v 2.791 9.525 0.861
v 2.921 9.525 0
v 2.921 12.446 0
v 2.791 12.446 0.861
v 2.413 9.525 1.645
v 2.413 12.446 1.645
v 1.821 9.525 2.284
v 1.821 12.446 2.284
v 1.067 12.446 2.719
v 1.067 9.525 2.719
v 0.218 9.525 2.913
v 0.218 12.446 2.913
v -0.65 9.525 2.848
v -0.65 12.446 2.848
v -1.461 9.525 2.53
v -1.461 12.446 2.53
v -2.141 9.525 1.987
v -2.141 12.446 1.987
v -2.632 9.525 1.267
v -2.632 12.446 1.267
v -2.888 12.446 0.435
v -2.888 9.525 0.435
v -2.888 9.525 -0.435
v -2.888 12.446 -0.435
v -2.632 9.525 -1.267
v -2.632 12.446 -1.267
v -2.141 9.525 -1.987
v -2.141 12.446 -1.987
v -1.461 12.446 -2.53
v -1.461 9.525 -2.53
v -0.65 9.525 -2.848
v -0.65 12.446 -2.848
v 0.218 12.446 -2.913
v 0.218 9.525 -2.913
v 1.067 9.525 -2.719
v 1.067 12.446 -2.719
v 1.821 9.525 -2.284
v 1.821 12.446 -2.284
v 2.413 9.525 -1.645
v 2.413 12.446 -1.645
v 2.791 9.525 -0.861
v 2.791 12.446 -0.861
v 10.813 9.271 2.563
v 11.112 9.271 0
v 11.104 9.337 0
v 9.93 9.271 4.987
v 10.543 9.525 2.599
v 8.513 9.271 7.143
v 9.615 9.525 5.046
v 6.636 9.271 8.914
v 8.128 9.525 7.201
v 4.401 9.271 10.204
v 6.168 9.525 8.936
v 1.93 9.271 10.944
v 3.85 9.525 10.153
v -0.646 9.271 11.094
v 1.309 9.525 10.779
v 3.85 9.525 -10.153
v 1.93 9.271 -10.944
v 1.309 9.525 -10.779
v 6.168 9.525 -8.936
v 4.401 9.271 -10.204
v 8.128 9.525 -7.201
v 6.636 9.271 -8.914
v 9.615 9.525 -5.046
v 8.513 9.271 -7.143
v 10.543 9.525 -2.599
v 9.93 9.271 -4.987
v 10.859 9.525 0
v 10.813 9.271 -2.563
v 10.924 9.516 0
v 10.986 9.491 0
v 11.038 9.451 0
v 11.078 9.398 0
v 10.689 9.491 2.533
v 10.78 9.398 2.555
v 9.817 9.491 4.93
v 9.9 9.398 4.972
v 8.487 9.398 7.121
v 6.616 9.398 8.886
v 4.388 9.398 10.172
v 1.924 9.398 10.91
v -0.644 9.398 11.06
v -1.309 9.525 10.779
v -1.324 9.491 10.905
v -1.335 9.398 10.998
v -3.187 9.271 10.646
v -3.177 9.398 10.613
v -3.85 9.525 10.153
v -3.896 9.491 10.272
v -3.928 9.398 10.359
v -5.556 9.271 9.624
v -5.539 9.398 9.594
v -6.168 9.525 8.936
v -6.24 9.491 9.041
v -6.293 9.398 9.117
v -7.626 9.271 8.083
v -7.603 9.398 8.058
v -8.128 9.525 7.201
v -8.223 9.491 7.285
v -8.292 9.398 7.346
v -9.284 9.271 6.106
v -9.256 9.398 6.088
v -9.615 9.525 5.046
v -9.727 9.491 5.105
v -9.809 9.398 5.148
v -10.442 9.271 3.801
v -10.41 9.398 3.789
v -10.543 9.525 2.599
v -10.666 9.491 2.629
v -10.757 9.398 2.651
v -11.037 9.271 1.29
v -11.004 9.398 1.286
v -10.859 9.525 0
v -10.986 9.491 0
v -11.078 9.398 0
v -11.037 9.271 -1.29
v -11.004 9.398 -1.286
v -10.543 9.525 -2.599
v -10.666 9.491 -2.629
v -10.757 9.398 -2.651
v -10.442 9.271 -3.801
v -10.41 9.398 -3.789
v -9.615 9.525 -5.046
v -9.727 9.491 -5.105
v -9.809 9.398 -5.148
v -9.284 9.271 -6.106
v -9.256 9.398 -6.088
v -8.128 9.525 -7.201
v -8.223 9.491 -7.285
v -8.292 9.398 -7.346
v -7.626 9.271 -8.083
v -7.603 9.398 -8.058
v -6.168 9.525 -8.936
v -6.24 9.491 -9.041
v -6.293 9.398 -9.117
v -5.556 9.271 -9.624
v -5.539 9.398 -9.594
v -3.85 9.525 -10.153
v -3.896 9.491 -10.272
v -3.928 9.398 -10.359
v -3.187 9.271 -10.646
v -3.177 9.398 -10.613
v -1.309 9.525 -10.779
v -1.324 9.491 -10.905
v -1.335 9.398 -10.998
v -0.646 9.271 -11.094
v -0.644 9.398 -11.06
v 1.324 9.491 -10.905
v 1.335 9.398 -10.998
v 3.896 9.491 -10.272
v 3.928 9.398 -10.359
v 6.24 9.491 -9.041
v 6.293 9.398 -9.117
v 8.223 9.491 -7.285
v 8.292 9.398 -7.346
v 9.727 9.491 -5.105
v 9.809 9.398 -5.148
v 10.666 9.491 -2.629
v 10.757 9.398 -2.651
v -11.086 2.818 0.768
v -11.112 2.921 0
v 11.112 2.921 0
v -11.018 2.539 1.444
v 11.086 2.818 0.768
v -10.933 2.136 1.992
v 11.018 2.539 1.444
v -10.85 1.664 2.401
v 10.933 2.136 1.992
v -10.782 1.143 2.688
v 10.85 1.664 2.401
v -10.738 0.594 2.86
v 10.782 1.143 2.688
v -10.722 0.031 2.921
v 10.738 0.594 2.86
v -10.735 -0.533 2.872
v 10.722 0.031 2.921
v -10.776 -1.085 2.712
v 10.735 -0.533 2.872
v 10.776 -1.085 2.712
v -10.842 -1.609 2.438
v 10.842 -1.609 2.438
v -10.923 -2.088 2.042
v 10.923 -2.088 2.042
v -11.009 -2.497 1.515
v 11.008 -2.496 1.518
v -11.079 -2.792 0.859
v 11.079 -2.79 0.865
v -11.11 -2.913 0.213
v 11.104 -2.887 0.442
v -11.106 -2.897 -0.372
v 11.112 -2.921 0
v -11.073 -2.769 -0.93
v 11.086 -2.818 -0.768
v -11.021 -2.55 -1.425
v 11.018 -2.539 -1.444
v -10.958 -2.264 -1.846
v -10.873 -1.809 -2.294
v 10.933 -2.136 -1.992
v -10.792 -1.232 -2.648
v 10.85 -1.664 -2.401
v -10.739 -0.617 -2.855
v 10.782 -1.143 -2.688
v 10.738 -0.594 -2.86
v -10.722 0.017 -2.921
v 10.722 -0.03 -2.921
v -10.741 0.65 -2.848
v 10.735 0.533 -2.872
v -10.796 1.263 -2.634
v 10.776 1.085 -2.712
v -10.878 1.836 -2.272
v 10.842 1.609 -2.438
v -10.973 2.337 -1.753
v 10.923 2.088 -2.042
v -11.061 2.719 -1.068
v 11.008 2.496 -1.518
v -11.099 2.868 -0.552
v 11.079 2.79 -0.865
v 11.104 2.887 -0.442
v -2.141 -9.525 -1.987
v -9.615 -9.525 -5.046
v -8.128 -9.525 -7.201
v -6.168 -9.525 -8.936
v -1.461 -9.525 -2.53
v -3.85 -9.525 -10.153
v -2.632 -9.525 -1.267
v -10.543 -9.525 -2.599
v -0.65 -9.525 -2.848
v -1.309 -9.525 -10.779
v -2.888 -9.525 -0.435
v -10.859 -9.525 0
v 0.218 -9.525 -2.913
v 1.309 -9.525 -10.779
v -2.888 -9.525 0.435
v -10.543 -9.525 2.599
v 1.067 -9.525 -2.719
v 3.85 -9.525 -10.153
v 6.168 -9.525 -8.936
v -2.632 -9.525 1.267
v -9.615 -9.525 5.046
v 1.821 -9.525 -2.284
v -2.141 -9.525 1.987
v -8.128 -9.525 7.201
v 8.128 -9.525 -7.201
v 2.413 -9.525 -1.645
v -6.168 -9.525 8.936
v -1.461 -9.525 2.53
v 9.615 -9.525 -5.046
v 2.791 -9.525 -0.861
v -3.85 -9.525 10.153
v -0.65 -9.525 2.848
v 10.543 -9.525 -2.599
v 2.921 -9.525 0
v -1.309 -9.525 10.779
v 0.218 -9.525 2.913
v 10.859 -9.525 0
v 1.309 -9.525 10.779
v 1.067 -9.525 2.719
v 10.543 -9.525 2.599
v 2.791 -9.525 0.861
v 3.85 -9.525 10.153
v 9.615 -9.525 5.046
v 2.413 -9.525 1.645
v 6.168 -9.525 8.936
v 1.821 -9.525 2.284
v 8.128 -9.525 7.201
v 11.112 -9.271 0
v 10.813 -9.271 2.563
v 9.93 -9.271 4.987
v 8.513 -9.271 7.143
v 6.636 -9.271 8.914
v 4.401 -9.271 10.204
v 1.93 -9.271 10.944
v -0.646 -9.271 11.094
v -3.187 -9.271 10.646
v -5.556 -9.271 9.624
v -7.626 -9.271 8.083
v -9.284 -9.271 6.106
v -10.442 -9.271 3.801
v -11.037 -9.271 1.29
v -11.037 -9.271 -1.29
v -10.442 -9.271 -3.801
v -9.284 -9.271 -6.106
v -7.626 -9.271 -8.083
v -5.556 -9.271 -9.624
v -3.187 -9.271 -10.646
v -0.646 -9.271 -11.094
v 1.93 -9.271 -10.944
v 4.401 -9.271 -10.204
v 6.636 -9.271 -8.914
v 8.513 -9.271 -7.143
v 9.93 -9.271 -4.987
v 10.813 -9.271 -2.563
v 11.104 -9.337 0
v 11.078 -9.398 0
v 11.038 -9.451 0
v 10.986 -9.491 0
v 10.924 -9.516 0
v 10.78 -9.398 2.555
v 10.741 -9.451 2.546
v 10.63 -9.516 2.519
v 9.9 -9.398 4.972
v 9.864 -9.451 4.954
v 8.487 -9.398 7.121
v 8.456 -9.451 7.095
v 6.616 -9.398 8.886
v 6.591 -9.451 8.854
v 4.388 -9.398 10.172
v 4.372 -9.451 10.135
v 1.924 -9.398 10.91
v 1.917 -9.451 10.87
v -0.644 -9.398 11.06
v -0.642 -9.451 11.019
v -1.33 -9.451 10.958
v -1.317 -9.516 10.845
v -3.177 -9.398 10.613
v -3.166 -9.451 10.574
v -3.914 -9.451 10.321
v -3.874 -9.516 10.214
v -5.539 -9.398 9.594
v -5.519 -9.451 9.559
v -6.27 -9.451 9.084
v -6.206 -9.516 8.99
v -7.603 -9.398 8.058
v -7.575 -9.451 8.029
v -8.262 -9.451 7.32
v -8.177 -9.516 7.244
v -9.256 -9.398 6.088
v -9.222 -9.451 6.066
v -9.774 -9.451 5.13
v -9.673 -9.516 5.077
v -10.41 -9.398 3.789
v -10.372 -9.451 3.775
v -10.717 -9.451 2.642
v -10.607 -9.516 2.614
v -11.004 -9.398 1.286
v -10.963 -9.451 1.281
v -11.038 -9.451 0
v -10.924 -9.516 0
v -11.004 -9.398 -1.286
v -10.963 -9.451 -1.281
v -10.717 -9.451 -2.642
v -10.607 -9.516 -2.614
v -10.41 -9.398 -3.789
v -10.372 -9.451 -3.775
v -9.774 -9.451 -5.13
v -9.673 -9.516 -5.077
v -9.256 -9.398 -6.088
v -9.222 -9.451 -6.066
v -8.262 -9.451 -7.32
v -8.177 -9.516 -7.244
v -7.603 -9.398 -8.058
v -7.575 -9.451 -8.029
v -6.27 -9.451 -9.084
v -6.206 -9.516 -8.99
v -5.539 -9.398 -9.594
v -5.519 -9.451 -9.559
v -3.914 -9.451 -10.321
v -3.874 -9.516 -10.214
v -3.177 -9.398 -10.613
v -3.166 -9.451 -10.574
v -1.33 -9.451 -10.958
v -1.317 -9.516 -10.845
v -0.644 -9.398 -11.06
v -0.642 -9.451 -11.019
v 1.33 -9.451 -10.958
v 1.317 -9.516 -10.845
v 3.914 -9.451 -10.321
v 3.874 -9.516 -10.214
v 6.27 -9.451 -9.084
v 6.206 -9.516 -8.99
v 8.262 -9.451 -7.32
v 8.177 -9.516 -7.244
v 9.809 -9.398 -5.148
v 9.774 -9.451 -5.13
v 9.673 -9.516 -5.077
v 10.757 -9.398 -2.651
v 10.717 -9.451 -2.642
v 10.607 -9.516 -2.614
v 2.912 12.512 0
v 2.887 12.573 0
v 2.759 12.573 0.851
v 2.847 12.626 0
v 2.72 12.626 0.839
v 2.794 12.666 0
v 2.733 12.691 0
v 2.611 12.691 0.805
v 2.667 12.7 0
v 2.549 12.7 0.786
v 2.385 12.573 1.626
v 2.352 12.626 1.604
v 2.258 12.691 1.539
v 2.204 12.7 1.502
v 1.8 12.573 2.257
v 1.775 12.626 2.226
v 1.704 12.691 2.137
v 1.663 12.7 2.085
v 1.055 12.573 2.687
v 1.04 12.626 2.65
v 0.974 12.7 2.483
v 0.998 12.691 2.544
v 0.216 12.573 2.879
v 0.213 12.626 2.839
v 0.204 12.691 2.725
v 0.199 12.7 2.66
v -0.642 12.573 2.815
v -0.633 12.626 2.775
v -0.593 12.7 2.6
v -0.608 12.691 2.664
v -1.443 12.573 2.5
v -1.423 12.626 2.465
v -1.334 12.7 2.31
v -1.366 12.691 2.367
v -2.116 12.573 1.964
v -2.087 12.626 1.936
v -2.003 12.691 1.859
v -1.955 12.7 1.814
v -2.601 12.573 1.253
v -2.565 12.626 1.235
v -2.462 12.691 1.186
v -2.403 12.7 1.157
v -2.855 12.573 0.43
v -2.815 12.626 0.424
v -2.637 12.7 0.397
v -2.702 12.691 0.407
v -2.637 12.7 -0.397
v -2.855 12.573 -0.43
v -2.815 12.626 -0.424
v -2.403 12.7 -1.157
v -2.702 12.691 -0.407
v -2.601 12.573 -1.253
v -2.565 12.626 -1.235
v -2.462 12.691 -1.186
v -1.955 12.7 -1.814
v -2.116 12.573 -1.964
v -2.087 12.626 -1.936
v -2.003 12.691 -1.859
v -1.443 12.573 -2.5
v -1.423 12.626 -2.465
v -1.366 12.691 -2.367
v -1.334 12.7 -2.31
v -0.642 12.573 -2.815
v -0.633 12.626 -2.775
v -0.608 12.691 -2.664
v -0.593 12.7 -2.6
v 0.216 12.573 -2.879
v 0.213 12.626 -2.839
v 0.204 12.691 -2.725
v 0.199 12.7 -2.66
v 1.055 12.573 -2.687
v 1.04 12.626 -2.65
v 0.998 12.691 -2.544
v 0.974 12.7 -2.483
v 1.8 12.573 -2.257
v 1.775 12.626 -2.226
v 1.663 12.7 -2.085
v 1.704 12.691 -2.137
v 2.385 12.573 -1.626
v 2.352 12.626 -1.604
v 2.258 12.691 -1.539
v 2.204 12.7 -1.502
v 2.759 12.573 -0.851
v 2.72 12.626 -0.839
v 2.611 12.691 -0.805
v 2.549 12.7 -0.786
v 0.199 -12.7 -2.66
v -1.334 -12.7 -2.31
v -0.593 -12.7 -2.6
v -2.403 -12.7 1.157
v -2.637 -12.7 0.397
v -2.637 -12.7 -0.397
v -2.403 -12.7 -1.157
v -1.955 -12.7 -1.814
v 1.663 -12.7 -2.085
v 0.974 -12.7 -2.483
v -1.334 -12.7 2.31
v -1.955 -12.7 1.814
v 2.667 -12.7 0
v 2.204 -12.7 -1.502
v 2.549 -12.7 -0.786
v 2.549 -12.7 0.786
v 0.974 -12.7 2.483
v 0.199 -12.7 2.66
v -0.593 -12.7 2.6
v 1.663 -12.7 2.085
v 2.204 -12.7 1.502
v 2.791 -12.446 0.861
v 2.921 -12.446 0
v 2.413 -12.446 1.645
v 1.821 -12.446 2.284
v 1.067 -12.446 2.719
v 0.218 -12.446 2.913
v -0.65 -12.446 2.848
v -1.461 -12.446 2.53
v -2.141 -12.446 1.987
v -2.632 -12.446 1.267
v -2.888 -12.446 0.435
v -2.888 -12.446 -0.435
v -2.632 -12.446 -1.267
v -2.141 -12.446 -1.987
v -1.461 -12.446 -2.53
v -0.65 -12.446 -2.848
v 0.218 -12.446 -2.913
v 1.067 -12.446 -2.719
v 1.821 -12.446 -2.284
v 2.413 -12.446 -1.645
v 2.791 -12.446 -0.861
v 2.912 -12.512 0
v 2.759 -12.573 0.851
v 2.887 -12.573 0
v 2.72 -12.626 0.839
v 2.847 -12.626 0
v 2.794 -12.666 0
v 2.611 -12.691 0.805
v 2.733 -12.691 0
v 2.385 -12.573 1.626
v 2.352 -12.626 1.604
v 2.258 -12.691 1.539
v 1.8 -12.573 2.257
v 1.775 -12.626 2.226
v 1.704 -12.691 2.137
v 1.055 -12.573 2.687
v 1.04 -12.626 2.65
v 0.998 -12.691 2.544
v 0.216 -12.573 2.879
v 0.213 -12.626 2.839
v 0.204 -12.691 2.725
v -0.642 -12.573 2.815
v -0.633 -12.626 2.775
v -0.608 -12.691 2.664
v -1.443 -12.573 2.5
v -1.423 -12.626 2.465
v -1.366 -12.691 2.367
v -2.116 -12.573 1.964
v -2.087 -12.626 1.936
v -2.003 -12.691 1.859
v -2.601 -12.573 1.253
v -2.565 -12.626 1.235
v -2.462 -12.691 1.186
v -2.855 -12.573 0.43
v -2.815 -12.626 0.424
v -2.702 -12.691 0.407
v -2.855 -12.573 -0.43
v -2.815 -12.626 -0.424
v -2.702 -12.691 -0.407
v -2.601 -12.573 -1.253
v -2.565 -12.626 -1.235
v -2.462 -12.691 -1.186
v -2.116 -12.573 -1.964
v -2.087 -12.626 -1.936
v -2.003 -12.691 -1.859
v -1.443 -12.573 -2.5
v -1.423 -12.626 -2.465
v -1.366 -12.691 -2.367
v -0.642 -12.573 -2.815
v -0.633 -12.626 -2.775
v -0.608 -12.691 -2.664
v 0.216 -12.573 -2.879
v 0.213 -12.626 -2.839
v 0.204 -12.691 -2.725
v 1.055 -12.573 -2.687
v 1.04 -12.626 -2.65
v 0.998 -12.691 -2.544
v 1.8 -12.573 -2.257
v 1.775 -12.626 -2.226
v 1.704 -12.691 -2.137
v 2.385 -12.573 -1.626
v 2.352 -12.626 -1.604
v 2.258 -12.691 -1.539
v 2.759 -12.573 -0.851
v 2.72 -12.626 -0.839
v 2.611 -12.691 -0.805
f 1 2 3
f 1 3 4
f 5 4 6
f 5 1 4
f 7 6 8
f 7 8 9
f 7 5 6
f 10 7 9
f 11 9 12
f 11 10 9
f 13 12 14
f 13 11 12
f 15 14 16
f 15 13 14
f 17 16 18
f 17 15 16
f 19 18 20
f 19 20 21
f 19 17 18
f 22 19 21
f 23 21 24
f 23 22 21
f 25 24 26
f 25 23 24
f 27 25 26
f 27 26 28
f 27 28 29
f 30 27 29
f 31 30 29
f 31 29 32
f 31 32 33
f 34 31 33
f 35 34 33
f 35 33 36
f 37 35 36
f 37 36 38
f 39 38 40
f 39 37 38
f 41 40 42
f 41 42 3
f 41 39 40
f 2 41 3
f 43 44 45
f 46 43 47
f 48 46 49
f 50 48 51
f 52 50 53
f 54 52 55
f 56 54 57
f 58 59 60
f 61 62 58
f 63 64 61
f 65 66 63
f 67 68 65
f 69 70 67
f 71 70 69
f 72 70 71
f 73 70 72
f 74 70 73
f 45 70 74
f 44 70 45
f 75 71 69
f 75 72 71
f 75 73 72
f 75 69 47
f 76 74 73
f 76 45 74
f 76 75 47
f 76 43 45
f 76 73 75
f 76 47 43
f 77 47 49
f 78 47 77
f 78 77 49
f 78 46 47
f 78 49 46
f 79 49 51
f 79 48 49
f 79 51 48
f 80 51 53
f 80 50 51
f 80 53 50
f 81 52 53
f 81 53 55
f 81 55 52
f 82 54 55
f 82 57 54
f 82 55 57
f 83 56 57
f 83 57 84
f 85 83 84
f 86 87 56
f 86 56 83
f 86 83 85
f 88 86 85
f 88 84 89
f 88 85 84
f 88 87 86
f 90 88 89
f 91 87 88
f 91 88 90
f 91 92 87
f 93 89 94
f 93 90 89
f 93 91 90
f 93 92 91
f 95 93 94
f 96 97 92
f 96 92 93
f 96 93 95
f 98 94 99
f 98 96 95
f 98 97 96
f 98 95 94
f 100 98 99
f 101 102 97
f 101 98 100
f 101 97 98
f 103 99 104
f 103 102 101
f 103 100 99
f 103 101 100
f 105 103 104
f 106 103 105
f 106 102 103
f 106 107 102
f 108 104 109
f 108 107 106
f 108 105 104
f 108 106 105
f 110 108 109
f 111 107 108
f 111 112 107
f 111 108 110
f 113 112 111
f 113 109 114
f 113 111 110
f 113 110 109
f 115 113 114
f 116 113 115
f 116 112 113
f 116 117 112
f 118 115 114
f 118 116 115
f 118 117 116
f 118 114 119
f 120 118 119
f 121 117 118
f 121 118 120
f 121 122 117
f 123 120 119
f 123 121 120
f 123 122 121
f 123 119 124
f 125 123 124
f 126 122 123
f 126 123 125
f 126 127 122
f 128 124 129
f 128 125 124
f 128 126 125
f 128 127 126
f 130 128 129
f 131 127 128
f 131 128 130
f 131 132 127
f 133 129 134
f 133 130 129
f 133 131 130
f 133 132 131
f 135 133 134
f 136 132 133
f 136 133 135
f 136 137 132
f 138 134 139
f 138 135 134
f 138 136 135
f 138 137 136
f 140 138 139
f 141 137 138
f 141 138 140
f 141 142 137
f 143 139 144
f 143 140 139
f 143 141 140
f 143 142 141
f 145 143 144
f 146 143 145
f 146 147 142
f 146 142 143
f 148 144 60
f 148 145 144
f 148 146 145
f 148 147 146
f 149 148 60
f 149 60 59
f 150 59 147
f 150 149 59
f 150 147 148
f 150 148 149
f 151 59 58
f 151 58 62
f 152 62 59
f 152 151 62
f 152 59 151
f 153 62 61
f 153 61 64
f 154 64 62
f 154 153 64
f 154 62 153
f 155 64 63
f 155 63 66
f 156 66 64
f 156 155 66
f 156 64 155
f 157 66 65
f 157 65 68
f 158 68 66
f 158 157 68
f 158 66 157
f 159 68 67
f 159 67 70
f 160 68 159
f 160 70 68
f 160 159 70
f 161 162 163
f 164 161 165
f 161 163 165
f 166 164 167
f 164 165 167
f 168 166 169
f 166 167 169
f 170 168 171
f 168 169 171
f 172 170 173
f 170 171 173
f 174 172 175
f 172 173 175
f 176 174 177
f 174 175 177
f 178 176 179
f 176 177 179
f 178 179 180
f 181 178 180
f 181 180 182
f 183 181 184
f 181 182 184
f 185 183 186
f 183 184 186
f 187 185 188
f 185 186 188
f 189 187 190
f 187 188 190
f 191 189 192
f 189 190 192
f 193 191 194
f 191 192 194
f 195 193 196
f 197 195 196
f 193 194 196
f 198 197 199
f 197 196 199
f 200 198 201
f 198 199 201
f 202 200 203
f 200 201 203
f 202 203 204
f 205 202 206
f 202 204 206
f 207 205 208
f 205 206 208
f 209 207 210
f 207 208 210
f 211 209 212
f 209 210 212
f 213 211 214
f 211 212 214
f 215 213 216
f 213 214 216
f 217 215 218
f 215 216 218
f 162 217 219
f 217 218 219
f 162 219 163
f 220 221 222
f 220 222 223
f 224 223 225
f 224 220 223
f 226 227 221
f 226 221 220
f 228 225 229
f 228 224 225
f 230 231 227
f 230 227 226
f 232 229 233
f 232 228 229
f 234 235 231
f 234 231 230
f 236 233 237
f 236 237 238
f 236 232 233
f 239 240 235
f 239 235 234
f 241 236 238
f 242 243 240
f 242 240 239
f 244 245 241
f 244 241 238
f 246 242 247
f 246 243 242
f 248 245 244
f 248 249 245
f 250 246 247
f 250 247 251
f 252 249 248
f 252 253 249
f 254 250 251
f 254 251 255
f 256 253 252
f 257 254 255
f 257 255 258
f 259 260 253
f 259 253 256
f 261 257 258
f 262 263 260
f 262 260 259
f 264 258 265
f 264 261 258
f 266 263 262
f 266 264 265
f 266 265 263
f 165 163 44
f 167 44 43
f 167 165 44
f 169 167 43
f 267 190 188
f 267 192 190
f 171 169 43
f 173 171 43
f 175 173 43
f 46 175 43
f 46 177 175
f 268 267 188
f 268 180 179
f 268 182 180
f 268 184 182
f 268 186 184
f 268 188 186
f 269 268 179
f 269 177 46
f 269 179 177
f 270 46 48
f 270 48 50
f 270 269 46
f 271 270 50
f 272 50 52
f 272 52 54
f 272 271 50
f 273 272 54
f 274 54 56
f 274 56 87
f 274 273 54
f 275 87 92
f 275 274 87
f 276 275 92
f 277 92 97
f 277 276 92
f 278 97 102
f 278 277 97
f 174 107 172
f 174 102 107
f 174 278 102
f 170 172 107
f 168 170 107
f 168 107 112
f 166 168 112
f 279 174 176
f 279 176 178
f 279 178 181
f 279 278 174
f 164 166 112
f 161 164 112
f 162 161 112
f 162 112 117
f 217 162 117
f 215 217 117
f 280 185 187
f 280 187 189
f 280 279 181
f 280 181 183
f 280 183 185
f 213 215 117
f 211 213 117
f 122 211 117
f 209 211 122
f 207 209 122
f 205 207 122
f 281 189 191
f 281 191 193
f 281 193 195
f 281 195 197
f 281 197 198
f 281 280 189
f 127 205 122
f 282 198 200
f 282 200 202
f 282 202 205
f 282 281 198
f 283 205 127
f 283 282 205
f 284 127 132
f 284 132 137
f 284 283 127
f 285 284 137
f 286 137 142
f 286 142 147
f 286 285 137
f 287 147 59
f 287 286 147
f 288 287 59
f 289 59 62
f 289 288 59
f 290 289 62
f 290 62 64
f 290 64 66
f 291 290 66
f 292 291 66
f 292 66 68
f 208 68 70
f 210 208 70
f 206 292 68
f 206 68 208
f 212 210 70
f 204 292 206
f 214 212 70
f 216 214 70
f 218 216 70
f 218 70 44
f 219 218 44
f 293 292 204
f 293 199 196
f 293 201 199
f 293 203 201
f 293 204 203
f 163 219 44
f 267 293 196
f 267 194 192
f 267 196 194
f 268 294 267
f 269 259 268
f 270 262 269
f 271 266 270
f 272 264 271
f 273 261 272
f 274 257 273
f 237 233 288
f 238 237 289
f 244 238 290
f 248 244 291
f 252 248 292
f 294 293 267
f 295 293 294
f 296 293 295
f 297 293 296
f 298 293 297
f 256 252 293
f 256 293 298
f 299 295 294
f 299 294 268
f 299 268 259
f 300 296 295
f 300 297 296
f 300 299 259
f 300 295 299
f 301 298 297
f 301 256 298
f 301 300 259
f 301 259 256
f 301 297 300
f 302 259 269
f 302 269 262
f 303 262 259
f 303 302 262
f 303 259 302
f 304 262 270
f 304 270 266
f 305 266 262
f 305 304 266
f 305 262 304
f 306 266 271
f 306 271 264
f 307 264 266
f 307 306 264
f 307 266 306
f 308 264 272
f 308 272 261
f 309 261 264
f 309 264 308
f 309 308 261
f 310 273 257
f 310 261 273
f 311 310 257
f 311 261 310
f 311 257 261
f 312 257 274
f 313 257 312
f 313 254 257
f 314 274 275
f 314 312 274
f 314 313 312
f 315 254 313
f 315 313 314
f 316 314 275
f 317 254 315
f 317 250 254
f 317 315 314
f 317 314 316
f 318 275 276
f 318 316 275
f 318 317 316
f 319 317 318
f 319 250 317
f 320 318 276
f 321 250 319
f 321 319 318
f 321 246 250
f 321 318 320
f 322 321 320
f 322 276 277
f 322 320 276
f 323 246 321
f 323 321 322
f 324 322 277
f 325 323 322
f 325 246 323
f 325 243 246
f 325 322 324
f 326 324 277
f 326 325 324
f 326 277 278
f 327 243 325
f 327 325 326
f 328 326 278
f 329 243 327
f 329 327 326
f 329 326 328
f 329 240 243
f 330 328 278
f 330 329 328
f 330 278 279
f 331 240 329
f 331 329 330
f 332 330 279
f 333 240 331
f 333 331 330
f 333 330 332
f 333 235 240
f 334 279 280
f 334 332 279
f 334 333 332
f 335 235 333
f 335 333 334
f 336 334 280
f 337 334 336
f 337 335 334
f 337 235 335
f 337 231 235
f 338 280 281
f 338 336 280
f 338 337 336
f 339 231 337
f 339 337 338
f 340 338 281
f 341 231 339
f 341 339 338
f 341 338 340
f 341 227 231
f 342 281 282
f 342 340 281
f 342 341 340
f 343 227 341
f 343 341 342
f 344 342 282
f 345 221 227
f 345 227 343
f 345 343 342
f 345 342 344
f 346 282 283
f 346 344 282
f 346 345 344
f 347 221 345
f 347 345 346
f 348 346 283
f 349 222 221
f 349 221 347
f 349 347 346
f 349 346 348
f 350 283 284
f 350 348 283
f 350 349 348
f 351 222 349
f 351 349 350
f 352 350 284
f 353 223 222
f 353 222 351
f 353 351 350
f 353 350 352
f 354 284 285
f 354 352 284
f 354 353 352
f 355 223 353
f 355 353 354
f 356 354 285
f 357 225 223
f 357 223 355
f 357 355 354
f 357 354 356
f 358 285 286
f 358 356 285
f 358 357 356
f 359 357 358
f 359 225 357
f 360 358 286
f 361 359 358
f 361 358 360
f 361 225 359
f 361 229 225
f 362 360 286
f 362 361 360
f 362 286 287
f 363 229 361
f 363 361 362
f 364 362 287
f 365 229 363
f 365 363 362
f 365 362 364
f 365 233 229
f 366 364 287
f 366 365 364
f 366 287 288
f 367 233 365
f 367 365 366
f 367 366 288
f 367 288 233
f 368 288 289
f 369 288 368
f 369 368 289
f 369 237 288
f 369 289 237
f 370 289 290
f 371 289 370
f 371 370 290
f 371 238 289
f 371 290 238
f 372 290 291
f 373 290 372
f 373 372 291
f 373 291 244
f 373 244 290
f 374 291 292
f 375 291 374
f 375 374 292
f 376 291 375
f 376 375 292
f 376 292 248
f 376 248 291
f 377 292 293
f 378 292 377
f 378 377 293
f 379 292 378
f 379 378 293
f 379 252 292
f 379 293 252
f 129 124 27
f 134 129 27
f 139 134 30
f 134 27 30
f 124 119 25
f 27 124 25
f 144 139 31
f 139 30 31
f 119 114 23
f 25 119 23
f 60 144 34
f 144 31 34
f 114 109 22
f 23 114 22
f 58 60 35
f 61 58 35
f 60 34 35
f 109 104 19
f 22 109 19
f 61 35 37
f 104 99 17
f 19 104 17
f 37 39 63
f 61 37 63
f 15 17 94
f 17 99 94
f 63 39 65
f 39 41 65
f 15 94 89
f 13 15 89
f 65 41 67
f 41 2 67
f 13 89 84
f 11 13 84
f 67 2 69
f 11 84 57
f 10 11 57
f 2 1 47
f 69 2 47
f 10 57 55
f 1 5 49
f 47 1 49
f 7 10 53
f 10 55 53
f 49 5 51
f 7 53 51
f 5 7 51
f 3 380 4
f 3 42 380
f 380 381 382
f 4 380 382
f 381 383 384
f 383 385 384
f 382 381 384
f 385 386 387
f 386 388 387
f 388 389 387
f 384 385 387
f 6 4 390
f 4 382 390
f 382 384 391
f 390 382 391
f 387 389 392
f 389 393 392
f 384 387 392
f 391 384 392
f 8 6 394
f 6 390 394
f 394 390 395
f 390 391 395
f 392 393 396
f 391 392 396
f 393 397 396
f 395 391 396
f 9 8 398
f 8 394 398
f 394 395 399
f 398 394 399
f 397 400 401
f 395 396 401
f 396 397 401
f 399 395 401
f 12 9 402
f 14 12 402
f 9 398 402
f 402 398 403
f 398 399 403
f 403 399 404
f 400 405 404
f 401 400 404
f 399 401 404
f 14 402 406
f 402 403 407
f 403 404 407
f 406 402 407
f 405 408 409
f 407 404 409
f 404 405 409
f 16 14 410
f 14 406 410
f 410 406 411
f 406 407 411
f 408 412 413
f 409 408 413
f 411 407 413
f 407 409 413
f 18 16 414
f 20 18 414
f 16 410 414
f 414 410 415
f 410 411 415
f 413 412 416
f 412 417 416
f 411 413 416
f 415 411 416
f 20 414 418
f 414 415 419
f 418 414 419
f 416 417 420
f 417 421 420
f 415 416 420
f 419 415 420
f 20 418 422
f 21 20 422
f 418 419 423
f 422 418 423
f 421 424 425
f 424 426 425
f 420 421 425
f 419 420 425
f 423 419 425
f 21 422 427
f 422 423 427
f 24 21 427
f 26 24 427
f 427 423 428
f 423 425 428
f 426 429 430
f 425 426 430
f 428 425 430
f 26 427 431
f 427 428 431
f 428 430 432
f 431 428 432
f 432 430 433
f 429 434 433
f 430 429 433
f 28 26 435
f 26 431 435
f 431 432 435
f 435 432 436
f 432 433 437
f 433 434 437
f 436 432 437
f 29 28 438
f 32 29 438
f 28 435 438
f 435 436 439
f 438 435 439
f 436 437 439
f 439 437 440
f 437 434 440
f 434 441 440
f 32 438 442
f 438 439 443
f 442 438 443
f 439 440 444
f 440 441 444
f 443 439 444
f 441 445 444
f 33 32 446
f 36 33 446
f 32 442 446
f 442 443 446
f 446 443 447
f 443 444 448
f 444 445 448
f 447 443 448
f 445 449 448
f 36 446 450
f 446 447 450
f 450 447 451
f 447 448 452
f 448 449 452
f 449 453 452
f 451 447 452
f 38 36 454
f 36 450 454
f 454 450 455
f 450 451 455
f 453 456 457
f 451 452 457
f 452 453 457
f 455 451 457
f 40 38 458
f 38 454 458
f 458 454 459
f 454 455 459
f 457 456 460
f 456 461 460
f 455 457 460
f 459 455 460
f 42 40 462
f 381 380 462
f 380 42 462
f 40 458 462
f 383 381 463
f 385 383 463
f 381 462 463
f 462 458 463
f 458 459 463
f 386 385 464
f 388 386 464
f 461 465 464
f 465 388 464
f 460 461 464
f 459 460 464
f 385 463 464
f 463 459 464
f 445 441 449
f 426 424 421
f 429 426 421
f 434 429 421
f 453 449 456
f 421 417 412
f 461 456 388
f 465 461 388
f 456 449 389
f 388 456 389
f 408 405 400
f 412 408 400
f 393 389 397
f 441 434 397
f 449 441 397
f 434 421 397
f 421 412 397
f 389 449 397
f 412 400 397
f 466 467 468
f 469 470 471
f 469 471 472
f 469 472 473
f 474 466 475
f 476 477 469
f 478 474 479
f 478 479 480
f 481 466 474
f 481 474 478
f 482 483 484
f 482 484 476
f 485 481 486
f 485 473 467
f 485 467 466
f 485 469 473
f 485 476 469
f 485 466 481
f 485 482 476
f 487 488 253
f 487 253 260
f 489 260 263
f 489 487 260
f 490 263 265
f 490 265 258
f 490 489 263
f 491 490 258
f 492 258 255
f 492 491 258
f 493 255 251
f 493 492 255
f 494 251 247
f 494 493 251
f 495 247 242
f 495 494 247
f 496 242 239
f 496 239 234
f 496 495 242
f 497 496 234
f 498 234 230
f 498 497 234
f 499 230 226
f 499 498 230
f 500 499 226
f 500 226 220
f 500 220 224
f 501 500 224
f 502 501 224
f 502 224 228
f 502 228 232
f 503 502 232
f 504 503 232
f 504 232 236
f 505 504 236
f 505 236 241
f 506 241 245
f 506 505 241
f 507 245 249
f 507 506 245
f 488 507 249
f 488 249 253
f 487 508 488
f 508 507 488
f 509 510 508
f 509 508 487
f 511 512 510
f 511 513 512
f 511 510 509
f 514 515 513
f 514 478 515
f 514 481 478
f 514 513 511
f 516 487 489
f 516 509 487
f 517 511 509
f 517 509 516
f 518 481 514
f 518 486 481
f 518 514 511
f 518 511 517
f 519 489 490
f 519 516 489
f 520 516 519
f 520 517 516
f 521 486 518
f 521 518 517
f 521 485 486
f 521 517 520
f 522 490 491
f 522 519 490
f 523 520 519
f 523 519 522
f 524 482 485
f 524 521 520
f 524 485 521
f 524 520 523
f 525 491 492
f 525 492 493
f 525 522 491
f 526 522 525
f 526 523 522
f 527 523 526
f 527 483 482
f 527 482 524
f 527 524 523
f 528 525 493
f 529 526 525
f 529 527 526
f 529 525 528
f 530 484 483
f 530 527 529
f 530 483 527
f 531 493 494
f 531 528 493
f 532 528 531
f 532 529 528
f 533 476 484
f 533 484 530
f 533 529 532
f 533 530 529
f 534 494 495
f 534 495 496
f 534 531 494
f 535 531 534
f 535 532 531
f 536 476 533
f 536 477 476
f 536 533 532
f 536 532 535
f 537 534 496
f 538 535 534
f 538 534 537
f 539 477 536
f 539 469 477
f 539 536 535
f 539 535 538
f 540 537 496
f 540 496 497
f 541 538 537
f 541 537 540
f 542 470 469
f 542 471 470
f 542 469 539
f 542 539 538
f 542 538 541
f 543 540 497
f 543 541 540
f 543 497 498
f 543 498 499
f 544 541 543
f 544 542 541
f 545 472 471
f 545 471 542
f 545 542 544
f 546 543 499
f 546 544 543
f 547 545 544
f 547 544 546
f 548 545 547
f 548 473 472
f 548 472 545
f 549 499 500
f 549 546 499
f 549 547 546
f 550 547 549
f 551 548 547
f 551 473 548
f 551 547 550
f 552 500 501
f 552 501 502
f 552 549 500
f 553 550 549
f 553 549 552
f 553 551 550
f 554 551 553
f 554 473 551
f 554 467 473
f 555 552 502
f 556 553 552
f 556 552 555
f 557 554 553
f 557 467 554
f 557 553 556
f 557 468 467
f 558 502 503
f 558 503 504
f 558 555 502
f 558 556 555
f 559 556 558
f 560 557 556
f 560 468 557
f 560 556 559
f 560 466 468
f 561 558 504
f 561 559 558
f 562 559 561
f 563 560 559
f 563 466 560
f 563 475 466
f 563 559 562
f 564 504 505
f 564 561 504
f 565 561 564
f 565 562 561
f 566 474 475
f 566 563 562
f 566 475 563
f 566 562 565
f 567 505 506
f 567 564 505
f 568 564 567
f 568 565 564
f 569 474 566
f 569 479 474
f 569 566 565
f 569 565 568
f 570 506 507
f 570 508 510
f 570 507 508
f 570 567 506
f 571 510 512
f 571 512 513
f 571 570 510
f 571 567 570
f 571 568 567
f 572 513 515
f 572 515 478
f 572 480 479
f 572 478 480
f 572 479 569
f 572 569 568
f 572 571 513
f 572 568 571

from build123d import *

# Parameters (mm, degrees)
F0_R     = 11.1125
F3_DEPTH = 9.525
F1_R     = 2.921
F4_DEPTH = 12.7
F2_R     = 2.921
F5_DEPTH = 12.7
F6_R     = 0.254


with BuildPart() as f3:
    # F0 (on Front) → F3 (new body, symmetric)
    with BuildSketch(Plane.XZ):
        Circle(F0_R)
    extrude(amount=F3_DEPTH, both=True)

    # F1 (on Front) → F4 (join, symmetric)
    with BuildSketch(Plane.XZ):
        Circle(F1_R)
    extrude(amount=F4_DEPTH, both=True)

    # F2 (on Right) → F5 (cut, symmetric)
    with BuildSketch(Plane.YZ):
        Circle(F2_R)
    extrude(amount=F5_DEPTH, both=True, mode=Mode.SUBTRACT)

    # F6
    f6_edges = [f3.edges().sort_by_distance(p)[0] for p in [
        (-2.921, -12.7, 0),
        (-11.1125, -9.525, 0),
        (-11.1125, 9.525, 0),
        (-2.921, 12.7, 0),
    ]]
    fillet(f6_edges, radius=F6_R)


solid = f3.part
